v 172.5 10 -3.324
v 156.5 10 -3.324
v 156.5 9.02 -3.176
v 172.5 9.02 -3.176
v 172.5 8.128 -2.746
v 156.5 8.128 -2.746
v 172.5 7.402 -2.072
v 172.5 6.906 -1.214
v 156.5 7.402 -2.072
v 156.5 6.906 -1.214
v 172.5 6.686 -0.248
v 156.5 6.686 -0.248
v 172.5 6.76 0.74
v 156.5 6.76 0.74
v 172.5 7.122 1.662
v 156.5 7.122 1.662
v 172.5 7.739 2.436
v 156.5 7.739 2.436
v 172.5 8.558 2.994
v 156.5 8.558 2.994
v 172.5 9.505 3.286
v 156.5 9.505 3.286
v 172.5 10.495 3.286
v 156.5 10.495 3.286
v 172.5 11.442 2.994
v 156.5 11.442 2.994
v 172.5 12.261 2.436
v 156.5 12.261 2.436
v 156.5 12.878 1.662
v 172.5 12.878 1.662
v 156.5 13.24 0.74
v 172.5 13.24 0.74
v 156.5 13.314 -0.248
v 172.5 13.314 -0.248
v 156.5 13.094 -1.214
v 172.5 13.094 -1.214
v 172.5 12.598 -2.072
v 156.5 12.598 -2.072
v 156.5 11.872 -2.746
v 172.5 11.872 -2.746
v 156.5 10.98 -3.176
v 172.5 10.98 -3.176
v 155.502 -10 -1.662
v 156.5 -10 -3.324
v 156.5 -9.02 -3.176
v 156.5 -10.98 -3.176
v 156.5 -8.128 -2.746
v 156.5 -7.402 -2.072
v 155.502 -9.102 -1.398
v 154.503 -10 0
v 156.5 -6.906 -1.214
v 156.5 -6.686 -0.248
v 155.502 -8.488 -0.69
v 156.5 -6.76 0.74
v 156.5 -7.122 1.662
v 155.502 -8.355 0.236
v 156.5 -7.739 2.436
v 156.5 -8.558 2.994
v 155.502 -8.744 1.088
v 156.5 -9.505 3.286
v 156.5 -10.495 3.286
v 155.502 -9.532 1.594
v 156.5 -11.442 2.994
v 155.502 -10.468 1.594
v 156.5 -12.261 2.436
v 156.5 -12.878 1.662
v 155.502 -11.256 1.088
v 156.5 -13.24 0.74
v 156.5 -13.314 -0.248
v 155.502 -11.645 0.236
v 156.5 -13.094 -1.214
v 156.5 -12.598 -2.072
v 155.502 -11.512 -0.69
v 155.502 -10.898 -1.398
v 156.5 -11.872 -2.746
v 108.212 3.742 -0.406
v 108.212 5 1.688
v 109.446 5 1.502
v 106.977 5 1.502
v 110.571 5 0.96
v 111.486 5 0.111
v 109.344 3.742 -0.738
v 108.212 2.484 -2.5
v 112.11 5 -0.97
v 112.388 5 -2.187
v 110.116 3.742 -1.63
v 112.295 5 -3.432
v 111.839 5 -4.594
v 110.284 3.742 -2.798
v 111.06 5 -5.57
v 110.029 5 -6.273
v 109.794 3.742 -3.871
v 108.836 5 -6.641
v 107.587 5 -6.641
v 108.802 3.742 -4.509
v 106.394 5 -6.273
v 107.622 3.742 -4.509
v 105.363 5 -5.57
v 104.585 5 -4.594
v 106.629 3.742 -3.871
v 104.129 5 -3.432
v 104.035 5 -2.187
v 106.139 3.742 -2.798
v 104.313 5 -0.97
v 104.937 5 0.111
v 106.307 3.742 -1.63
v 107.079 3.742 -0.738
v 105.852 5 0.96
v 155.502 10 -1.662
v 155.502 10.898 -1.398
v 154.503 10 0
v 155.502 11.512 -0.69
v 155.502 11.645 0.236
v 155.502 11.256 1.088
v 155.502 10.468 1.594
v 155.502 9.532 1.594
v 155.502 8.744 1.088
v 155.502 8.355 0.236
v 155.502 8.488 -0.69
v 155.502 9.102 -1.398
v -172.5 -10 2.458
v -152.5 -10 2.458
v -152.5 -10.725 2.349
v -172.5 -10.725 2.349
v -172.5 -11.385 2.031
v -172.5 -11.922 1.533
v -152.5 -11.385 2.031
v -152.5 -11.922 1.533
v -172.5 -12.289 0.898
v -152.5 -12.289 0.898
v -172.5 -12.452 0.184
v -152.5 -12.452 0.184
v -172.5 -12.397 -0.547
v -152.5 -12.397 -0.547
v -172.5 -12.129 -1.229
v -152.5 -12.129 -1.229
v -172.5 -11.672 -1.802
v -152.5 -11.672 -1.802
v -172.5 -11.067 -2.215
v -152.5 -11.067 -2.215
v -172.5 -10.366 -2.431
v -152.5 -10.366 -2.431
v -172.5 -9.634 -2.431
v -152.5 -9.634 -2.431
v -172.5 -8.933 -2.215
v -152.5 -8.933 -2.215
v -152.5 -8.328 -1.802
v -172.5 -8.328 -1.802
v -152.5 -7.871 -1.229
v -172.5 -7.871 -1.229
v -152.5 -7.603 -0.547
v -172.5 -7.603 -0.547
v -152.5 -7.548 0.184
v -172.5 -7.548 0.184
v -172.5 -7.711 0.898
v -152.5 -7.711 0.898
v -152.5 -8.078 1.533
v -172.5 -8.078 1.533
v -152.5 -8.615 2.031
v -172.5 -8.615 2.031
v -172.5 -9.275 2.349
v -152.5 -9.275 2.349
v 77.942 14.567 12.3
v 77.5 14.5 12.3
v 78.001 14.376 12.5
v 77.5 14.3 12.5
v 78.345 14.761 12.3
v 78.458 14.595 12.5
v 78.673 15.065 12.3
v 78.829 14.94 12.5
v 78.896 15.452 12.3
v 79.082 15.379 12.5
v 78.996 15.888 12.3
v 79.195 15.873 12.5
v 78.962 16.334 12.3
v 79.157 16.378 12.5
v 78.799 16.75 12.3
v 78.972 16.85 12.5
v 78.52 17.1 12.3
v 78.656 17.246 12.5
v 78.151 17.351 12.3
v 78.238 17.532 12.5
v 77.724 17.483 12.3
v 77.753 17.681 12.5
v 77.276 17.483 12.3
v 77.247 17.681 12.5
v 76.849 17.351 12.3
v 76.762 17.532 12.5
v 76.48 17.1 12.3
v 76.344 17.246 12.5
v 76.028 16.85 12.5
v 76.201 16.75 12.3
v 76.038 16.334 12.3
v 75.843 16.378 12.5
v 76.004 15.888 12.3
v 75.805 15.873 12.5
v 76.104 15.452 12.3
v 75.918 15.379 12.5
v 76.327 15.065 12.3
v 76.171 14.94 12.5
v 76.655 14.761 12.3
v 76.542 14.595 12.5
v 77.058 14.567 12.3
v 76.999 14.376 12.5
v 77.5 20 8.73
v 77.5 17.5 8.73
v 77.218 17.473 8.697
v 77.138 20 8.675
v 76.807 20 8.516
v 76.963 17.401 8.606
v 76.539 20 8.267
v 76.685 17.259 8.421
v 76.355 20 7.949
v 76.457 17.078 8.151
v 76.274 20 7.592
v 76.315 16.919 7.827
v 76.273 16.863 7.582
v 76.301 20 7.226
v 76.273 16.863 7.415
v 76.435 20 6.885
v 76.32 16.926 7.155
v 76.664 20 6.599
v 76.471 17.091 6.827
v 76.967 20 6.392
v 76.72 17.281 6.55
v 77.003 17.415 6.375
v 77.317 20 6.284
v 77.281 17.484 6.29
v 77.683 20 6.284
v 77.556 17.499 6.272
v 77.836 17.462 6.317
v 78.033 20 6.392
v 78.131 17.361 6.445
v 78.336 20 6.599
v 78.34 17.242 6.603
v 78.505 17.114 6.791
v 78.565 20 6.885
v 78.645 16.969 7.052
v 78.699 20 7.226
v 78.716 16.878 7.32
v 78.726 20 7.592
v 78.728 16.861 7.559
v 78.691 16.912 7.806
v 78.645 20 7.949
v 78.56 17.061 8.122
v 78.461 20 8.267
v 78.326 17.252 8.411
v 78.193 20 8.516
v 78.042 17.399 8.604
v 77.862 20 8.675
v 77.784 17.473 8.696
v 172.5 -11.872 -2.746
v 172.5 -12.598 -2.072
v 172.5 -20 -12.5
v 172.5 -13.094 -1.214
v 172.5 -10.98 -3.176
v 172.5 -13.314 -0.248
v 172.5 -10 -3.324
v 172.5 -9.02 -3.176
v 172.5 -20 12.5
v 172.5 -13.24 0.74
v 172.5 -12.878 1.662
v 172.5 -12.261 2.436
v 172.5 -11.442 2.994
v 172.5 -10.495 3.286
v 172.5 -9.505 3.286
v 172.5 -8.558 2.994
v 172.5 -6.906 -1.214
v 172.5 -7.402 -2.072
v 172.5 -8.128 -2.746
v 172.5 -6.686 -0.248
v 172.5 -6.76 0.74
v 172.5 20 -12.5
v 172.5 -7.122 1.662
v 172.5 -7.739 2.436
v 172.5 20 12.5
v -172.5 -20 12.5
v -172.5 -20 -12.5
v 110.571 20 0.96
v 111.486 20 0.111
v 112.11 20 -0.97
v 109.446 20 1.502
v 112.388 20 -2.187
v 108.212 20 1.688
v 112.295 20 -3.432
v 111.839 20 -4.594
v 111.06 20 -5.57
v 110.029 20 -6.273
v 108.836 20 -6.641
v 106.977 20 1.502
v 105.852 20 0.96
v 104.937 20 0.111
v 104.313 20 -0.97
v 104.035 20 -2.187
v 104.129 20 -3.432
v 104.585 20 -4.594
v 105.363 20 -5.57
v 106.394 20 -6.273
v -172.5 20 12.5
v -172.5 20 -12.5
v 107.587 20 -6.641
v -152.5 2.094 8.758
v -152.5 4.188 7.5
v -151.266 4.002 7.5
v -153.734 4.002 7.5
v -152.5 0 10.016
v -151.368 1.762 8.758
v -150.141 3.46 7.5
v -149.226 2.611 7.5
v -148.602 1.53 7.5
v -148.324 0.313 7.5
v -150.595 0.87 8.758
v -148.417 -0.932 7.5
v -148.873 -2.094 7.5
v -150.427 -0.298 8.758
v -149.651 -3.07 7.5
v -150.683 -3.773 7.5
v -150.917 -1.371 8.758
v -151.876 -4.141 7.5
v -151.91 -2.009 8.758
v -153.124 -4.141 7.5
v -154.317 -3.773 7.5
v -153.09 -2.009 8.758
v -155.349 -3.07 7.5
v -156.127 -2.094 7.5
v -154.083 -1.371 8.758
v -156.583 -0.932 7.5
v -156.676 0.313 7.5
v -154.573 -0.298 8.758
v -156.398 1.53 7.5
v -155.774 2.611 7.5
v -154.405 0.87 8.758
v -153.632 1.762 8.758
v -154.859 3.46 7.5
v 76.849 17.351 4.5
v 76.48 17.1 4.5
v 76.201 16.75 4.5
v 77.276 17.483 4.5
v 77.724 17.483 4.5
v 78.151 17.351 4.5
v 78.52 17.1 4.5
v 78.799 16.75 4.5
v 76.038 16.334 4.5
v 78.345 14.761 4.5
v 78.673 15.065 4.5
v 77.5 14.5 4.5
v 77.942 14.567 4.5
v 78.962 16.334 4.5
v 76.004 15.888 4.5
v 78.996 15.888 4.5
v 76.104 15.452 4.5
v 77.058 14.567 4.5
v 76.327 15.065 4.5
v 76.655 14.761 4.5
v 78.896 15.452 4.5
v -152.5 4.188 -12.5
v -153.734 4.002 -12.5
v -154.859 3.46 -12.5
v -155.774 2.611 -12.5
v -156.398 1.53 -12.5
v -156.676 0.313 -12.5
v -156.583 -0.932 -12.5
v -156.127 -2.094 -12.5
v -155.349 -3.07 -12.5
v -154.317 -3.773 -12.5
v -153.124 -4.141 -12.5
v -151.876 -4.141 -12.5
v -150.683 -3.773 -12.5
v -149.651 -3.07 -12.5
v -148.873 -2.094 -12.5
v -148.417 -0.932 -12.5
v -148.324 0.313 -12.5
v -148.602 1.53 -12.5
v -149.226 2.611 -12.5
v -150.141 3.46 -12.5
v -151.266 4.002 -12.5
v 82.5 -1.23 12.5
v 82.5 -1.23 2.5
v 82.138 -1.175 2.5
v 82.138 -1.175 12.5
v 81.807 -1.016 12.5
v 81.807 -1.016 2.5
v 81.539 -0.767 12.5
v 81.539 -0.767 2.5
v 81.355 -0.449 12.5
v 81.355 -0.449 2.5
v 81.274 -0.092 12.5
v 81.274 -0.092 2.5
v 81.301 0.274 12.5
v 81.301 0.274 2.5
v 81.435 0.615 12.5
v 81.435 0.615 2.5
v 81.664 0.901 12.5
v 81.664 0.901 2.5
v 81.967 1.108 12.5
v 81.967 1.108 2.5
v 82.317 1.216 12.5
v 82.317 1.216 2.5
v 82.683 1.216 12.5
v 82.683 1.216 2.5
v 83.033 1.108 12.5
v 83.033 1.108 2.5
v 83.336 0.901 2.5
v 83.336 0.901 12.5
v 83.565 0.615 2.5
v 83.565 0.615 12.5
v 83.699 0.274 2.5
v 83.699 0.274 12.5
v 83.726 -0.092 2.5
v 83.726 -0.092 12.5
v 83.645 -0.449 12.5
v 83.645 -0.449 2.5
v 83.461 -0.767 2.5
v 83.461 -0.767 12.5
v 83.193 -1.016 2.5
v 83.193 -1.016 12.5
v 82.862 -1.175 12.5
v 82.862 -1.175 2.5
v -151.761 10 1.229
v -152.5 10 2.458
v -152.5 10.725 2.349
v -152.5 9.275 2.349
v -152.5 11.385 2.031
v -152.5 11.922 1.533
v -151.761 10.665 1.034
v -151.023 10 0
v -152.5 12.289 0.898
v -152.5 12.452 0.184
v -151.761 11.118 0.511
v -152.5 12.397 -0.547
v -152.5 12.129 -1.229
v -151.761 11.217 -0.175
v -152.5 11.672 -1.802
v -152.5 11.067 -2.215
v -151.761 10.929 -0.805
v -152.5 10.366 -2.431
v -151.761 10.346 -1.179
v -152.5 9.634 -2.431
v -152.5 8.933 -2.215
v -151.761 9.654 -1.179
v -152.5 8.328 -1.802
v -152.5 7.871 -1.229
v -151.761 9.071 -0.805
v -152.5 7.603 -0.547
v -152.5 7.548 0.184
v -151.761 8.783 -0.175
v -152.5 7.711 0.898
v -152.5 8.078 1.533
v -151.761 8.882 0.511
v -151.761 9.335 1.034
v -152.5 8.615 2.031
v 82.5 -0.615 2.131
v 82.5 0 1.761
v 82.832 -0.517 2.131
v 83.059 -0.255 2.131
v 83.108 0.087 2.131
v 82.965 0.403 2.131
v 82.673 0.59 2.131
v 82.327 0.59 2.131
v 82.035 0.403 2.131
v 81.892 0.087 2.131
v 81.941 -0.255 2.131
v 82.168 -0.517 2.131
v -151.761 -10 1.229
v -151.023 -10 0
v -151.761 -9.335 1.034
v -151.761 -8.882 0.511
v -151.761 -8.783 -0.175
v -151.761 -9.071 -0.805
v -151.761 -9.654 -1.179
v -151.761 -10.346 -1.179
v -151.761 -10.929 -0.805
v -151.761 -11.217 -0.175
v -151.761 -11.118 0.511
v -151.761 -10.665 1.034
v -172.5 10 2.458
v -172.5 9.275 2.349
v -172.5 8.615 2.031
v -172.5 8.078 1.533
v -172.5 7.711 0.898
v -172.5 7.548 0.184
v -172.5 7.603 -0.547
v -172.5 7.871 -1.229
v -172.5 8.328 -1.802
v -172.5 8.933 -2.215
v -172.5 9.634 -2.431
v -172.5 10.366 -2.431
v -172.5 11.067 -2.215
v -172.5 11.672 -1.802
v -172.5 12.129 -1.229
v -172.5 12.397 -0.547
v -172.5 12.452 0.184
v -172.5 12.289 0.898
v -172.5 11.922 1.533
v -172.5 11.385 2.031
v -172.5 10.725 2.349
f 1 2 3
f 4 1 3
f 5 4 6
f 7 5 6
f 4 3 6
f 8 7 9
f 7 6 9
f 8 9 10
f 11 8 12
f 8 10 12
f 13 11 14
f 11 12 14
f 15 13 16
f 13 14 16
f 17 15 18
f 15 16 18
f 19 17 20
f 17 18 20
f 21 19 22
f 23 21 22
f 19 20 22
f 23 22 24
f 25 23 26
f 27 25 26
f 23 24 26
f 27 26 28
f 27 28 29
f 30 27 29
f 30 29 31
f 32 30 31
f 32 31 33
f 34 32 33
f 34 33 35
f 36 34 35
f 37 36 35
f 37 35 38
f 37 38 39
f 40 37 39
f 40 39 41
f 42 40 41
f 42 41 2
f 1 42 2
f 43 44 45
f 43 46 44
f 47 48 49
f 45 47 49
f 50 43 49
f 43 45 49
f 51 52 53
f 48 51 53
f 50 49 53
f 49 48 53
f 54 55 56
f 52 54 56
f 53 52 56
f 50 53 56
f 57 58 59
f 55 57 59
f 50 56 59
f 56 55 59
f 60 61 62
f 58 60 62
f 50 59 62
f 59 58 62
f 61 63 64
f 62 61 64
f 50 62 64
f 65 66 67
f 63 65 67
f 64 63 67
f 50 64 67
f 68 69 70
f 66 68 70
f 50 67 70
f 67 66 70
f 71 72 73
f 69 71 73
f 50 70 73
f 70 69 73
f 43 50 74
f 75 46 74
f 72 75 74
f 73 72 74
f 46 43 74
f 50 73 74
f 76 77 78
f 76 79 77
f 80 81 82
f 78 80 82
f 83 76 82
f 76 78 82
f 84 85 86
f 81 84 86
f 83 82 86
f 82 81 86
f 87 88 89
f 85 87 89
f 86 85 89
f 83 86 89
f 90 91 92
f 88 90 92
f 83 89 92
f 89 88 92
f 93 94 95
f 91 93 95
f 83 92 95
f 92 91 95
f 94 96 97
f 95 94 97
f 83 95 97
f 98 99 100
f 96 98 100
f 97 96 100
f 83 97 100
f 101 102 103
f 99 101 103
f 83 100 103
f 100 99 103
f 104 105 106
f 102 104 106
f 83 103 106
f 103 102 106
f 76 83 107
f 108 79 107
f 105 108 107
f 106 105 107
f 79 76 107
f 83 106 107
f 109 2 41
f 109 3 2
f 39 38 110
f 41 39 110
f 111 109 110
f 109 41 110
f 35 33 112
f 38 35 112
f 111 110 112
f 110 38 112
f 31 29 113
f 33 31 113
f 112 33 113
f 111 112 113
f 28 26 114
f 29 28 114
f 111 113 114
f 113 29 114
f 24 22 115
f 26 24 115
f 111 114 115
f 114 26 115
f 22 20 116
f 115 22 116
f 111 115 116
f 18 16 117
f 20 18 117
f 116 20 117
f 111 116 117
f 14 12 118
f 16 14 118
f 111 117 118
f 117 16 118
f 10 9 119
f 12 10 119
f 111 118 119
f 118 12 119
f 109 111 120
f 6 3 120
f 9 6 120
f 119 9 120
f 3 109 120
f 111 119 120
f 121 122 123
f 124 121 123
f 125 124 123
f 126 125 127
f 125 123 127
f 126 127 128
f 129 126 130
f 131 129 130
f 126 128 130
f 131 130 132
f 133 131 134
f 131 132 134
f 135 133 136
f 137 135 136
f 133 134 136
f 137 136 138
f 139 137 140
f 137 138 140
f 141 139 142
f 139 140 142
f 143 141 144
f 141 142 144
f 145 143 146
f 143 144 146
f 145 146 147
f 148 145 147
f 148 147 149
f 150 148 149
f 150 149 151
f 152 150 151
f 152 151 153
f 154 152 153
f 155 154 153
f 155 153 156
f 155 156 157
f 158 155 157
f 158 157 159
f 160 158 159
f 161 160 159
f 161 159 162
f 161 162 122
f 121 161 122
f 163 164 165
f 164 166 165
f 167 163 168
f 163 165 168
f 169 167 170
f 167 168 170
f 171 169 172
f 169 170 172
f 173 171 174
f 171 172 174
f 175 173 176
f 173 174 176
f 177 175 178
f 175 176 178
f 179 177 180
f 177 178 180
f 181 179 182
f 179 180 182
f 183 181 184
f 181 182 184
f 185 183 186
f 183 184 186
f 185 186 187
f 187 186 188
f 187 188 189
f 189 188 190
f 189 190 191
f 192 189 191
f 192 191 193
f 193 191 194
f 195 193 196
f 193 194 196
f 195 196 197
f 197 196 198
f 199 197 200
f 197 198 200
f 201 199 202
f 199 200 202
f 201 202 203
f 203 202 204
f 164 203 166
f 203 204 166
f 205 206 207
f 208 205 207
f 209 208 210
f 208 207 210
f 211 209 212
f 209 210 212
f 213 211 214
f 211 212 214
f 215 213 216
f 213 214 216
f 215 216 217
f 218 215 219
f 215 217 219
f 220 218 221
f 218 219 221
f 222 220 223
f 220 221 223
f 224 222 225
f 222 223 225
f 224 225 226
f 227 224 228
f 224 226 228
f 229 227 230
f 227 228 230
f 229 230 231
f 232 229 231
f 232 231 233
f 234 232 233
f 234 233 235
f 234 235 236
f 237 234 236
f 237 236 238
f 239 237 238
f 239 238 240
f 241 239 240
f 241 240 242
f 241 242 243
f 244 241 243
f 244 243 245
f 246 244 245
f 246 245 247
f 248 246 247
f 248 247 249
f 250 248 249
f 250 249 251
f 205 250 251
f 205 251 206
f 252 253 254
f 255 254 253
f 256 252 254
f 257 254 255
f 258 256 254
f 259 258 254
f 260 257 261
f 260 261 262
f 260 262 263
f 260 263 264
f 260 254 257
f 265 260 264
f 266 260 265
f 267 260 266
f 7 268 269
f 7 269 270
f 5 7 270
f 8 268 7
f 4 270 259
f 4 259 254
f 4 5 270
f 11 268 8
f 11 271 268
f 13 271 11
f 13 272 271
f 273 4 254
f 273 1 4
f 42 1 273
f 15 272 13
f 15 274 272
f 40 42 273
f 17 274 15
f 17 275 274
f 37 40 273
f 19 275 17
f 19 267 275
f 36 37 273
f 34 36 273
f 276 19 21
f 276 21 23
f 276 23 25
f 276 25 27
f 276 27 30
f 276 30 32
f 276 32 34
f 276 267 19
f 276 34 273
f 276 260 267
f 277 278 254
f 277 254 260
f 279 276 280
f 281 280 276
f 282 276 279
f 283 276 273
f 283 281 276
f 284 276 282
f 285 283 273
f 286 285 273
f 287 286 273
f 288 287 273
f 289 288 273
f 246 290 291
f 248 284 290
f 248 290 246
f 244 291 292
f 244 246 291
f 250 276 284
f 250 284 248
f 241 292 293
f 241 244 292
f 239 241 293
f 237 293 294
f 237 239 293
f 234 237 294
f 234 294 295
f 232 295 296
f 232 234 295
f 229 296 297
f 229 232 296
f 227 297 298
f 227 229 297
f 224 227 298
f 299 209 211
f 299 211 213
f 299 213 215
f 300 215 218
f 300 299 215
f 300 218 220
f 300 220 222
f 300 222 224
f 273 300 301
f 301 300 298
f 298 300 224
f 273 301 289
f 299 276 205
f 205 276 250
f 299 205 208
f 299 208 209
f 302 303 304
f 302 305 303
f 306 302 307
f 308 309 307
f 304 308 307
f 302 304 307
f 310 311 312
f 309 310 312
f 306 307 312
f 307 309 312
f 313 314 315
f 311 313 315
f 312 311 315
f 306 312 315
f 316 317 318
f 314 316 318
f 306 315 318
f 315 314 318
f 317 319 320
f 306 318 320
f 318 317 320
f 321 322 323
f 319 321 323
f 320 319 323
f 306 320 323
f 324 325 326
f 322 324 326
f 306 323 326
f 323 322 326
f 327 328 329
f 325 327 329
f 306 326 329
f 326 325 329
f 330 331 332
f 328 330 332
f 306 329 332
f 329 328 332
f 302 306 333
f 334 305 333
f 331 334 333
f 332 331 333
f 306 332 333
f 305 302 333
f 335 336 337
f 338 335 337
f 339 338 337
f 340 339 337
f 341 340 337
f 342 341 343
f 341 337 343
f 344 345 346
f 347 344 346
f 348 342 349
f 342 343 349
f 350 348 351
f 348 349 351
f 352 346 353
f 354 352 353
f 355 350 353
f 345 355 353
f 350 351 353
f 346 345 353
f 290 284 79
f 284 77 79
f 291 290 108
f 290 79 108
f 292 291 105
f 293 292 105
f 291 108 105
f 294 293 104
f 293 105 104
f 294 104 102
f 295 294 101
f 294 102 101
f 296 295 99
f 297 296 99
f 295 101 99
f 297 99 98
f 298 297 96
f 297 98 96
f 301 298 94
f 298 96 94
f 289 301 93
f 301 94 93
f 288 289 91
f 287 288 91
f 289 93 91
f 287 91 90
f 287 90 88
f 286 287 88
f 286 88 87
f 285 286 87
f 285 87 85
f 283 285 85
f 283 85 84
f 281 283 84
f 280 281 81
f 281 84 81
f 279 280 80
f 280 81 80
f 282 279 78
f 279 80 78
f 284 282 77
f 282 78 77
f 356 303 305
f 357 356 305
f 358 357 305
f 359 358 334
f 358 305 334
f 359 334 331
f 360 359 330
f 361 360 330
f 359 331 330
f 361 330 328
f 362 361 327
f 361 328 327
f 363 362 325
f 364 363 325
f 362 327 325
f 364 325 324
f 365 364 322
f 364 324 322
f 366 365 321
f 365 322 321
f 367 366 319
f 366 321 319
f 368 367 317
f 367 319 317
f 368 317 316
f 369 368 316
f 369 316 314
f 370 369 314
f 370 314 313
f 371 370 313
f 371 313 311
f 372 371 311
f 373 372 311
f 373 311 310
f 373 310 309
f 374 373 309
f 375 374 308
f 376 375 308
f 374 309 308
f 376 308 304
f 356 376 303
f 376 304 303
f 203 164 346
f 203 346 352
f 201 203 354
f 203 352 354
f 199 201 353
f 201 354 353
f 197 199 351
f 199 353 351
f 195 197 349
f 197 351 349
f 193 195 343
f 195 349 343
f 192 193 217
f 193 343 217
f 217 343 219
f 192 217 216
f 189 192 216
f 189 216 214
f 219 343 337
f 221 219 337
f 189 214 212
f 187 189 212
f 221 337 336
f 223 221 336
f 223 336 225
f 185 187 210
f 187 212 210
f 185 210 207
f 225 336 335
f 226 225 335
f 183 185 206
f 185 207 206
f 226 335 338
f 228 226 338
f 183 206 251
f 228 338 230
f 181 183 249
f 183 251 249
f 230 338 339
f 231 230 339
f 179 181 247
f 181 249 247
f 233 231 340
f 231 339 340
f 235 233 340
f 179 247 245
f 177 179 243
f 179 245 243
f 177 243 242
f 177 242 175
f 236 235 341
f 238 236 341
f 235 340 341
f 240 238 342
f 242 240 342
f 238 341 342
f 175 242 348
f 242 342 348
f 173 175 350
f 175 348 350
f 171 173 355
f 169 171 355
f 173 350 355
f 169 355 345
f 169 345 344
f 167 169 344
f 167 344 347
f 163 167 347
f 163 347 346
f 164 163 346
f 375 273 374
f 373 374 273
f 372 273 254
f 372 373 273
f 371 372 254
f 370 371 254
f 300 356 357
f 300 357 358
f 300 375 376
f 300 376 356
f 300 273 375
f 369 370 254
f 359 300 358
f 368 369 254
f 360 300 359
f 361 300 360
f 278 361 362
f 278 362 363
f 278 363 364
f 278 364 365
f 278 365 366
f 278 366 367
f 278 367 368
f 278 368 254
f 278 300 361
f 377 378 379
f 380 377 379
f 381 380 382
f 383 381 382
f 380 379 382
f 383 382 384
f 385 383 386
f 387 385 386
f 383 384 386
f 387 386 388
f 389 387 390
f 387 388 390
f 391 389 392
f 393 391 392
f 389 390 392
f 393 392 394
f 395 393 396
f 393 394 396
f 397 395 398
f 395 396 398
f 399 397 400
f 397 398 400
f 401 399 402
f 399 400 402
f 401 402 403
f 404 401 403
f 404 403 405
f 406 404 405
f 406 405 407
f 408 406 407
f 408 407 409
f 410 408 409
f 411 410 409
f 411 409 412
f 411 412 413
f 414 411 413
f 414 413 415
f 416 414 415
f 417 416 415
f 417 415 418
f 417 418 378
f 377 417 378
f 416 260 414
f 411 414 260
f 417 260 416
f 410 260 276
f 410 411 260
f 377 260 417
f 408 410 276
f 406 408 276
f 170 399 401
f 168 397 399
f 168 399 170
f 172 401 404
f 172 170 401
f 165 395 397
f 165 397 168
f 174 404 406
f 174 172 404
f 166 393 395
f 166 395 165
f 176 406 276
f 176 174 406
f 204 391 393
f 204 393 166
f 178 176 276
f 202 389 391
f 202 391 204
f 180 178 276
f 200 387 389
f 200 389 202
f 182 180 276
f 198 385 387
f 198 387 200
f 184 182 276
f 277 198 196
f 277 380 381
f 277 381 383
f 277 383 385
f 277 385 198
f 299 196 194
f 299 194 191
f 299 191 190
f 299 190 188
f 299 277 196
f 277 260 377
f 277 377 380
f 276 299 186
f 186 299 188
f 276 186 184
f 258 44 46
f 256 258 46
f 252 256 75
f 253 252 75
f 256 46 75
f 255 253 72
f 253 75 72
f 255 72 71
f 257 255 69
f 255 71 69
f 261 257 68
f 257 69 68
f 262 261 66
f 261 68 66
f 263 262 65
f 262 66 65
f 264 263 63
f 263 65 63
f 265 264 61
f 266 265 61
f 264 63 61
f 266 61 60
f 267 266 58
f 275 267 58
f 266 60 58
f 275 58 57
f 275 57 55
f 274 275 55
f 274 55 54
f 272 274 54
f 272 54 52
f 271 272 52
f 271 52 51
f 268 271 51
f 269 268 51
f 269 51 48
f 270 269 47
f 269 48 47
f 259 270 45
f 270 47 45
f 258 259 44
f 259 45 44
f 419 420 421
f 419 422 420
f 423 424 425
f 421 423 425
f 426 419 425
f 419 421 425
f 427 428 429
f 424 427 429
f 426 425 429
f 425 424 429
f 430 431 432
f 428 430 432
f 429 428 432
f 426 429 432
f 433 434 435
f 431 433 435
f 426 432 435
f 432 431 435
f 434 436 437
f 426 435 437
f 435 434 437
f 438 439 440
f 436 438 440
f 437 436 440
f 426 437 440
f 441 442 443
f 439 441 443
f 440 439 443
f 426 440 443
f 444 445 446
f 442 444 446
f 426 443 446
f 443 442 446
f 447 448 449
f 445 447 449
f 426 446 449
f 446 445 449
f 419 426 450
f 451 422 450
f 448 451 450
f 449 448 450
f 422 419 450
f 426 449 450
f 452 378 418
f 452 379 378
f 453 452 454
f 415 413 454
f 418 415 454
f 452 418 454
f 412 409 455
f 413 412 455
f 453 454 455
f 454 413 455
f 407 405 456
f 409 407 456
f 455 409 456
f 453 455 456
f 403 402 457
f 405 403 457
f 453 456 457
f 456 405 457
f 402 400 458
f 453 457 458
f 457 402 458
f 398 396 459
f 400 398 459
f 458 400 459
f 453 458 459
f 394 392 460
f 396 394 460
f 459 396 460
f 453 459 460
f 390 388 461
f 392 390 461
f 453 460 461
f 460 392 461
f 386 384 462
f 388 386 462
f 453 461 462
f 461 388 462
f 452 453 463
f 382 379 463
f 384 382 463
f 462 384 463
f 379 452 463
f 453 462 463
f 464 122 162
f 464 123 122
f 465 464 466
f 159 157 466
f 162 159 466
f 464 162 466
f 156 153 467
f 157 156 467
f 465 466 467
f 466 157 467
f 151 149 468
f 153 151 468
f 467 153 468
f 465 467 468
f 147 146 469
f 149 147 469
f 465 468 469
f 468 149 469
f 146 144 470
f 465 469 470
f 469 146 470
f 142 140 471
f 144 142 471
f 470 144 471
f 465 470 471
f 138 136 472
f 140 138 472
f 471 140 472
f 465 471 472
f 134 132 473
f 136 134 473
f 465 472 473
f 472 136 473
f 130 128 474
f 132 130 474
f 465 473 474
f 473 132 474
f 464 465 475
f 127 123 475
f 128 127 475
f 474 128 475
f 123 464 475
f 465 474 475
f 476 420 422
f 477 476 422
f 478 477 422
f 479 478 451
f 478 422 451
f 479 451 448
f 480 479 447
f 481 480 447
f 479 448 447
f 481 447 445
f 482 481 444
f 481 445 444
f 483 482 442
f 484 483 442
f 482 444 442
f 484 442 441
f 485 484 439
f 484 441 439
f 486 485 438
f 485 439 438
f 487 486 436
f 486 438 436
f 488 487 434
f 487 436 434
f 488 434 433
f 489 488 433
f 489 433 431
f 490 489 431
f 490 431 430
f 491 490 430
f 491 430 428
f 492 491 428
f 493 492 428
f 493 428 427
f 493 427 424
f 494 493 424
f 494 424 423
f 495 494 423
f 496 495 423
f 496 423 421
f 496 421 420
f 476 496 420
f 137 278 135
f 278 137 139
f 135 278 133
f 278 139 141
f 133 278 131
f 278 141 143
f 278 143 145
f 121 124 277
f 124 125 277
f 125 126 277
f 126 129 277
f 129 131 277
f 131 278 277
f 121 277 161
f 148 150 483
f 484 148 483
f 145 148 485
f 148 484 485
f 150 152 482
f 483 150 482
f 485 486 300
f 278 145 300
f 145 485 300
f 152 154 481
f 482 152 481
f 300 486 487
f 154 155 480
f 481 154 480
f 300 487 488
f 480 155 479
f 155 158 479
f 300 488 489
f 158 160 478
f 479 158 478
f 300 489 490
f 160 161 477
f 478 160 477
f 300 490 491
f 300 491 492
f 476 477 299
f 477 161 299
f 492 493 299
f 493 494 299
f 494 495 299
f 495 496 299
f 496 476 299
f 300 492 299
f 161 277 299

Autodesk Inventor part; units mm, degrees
ref_plane "YZ Plane" through (0, 0, 0) normal (1, 0, 0) x (0, 1, 0)
ref_plane "XZ Plane" through (0, 0, 0) normal (0, 1, 0) x (-1, 0, 0)
ref_plane "XY Plane" through (0, 0, 0) normal (0, 0, 1) x (1, 0, 0)
sketch "Sketch1" plane through (0, 0, 0) normal (1, 0, 0) x (0, 1, 0)
  line L0 (-20, 12.5) -> (20, 12.5)
  line L1 (20, 12.5) -> (20, -12.5)
  line L2 (20, -12.5) -> (-20, -12.5)
  line L3 (-20, -12.5) -> (-20, 12.5)
  line L4 (-20, 12.5) -> (20, -12.5) construction
  line L5 (20, 12.5) -> (-20, -12.5) construction
  point P0 (0, 0)
  dimension "Width" = 40
  dimension "Thickness" = 25
extrude "Extrusion1" add sketch "Sketch1" along normal mid plane 345
sketch "Sketch2" plane through (-172.5, 0, 0) normal (-1, 0, 0) x (0, 0, 1)
  point P0 (0, 0)
  point P1 (0, 10)
  point P2 (0, -10)
  dimension "d4" = 20
  dimension "d5" = 10
hole "Hole1" at (-172.5, 10, 0) at (-172.5, -10, 0) direction (1, 0, 0) diameter 4.917 depth 20 tip angle 118 thread size "M6x1" class "6H" standard "ISO Metric profile"
sketch "Sketch3" plane through (-172.5, 20, 12.5) normal (0, 1, 0) x (1, 0, 0)
  line L0 (345, 25) -> (345, 0) projected
  line L1 (0, 25) -> (345, 25) projected
  point P0 (172.5, 12.5)
  point P1 (280.7116, 15)
  dimension "d13" = 64.2884
  dimension "d14" = 10
hole "Hole2" at (108.2116, 20, -2.5) direction (0, -1, 0) diameter 8.376 depth 15 tip angle 118 thread size "M10x1.5" class "6H" standard "ISO Metric profile"
sketch "Sketch4" plane through (172.5, 20, -12.5) normal (0, 0, -1) x (-1, 0, 0)
  line L0 (345, 0) -> (345, -40) projected
  line L1 (0, -40) -> (345, -40) projected
  point P0 (172.5, -20)
  point P1 (325, -20)
  dimension "d22" = 20
  dimension "d23" = 20
hole "Hole3" at (-152.5, 0, -12.5) direction (0, 0, 1) diameter 8.376 depth 20 tip angle 118 thread size "M10x1.5" class "6H" standard "ISO Metric profile"
sketch "Sketch5" plane through (172.5, 0, 0) normal (1, 0, 0) x (0, 0, -1)
  circle A0 centre (0, 10) radius 2.4585 projected
  circle A1 centre (0, -10) radius 2.4585 projected
  point P0 (0, 0)
hole "Hole4" at (172.5, 10, 0) at (172.5, -10, 0) direction (-1, 0, 0) diameter 6.647 depth 16 tip angle 118 thread size "M8x1.25" class "6H" standard "ISO Metric profile"
sketch "Sketch6" plane through (-172.5, -20, 12.5) normal (0, 0, 1) x (1, 0, 0)
  line L0 (345, 40) -> (345, 0) projected
  point P0 (172.5, 20)
  point P1 (255, 20)
  dimension "d38" = 90
hole "Hole5" at (82.5, 0, 12.5) direction (0, 0, -1) diameter 2.459 depth 10 tip angle 118 thread size "M3x0.5" class "6H" standard "ISO Metric profile"
sketch "Sketch7" plane through (-172.5, -20, 12.5) normal (0, 0, 1) x (1, 0, 0)
  line L0 (345, 40) -> (345, 0) projected
  line L1 (0, 40) -> (345, 40) projected
  point P0 (172.5, 20)
  point P1 (250, 36)
  dimension "d46" = 95
  dimension "d47" = 4
hole "Hole6" at (77.5, 16, 12.5) direction (0, 0, -1) diameter 3 depth 8
sketch "Sketch9" plane through (-172.5, -20, 12.5) normal (0, 0, 1) x (1, 0, 0)
  line L0 (251.5, 34.5) -> (248.5, 34.5)
  line L1 (248.5, 34.5) -> (248.5, 37.5)
  line L2 (248.5, 37.5) -> (251.5, 37.5)
  line L3 (251.5, 37.5) -> (251.5, 34.5)
  line L4 (251.5, 34.5) -> (248.5, 37.5) construction
  line L5 (248.5, 34.5) -> (251.5, 37.5) construction
  line L6 (0, 40) -> (345, 40) projected
  line L7 (345, 40) -> (345, 0) projected
  point P0 (250, 36)
  dimension "d67" = 4
  dimension "d68" = 95
  dimension "d69" = 3
extrude "Extrusion2" [suppressed]
sketch "Sketch8" plane through (-172.5, 20, 12.5) normal (0, 1, 0) x (1, 0, 0)
  line L0 (345, 25) -> (345, 0) projected
  line L1 (0, 0) -> (345, 0) projected
  point P0 (172.5, 12.5)
  point P1 (250, 5)
  dimension "d55" = 95
  dimension "d56" = 5
hole "Hole7" at (77.5, 20, 7.5) direction (0, -1, 0) diameter 2.459 depth 4 tip angle 118 thread size "M3x0.5" class "6H" standard "ISO Metric profile"
chamfer "Chamfer1" [suppressed]
chamfer "Chamfer2" distance 0.2 angle 45 1 edges at (77.5, 17.5, 12.5)
equation "\"d5\" = 0.5 * d4"
equation "\"d67\" = d47"
equation "\"d68\" = d46"
equation "\"d55\" = d46"
properties part number "Main Piller" material "Brass, Soft Yellow"
